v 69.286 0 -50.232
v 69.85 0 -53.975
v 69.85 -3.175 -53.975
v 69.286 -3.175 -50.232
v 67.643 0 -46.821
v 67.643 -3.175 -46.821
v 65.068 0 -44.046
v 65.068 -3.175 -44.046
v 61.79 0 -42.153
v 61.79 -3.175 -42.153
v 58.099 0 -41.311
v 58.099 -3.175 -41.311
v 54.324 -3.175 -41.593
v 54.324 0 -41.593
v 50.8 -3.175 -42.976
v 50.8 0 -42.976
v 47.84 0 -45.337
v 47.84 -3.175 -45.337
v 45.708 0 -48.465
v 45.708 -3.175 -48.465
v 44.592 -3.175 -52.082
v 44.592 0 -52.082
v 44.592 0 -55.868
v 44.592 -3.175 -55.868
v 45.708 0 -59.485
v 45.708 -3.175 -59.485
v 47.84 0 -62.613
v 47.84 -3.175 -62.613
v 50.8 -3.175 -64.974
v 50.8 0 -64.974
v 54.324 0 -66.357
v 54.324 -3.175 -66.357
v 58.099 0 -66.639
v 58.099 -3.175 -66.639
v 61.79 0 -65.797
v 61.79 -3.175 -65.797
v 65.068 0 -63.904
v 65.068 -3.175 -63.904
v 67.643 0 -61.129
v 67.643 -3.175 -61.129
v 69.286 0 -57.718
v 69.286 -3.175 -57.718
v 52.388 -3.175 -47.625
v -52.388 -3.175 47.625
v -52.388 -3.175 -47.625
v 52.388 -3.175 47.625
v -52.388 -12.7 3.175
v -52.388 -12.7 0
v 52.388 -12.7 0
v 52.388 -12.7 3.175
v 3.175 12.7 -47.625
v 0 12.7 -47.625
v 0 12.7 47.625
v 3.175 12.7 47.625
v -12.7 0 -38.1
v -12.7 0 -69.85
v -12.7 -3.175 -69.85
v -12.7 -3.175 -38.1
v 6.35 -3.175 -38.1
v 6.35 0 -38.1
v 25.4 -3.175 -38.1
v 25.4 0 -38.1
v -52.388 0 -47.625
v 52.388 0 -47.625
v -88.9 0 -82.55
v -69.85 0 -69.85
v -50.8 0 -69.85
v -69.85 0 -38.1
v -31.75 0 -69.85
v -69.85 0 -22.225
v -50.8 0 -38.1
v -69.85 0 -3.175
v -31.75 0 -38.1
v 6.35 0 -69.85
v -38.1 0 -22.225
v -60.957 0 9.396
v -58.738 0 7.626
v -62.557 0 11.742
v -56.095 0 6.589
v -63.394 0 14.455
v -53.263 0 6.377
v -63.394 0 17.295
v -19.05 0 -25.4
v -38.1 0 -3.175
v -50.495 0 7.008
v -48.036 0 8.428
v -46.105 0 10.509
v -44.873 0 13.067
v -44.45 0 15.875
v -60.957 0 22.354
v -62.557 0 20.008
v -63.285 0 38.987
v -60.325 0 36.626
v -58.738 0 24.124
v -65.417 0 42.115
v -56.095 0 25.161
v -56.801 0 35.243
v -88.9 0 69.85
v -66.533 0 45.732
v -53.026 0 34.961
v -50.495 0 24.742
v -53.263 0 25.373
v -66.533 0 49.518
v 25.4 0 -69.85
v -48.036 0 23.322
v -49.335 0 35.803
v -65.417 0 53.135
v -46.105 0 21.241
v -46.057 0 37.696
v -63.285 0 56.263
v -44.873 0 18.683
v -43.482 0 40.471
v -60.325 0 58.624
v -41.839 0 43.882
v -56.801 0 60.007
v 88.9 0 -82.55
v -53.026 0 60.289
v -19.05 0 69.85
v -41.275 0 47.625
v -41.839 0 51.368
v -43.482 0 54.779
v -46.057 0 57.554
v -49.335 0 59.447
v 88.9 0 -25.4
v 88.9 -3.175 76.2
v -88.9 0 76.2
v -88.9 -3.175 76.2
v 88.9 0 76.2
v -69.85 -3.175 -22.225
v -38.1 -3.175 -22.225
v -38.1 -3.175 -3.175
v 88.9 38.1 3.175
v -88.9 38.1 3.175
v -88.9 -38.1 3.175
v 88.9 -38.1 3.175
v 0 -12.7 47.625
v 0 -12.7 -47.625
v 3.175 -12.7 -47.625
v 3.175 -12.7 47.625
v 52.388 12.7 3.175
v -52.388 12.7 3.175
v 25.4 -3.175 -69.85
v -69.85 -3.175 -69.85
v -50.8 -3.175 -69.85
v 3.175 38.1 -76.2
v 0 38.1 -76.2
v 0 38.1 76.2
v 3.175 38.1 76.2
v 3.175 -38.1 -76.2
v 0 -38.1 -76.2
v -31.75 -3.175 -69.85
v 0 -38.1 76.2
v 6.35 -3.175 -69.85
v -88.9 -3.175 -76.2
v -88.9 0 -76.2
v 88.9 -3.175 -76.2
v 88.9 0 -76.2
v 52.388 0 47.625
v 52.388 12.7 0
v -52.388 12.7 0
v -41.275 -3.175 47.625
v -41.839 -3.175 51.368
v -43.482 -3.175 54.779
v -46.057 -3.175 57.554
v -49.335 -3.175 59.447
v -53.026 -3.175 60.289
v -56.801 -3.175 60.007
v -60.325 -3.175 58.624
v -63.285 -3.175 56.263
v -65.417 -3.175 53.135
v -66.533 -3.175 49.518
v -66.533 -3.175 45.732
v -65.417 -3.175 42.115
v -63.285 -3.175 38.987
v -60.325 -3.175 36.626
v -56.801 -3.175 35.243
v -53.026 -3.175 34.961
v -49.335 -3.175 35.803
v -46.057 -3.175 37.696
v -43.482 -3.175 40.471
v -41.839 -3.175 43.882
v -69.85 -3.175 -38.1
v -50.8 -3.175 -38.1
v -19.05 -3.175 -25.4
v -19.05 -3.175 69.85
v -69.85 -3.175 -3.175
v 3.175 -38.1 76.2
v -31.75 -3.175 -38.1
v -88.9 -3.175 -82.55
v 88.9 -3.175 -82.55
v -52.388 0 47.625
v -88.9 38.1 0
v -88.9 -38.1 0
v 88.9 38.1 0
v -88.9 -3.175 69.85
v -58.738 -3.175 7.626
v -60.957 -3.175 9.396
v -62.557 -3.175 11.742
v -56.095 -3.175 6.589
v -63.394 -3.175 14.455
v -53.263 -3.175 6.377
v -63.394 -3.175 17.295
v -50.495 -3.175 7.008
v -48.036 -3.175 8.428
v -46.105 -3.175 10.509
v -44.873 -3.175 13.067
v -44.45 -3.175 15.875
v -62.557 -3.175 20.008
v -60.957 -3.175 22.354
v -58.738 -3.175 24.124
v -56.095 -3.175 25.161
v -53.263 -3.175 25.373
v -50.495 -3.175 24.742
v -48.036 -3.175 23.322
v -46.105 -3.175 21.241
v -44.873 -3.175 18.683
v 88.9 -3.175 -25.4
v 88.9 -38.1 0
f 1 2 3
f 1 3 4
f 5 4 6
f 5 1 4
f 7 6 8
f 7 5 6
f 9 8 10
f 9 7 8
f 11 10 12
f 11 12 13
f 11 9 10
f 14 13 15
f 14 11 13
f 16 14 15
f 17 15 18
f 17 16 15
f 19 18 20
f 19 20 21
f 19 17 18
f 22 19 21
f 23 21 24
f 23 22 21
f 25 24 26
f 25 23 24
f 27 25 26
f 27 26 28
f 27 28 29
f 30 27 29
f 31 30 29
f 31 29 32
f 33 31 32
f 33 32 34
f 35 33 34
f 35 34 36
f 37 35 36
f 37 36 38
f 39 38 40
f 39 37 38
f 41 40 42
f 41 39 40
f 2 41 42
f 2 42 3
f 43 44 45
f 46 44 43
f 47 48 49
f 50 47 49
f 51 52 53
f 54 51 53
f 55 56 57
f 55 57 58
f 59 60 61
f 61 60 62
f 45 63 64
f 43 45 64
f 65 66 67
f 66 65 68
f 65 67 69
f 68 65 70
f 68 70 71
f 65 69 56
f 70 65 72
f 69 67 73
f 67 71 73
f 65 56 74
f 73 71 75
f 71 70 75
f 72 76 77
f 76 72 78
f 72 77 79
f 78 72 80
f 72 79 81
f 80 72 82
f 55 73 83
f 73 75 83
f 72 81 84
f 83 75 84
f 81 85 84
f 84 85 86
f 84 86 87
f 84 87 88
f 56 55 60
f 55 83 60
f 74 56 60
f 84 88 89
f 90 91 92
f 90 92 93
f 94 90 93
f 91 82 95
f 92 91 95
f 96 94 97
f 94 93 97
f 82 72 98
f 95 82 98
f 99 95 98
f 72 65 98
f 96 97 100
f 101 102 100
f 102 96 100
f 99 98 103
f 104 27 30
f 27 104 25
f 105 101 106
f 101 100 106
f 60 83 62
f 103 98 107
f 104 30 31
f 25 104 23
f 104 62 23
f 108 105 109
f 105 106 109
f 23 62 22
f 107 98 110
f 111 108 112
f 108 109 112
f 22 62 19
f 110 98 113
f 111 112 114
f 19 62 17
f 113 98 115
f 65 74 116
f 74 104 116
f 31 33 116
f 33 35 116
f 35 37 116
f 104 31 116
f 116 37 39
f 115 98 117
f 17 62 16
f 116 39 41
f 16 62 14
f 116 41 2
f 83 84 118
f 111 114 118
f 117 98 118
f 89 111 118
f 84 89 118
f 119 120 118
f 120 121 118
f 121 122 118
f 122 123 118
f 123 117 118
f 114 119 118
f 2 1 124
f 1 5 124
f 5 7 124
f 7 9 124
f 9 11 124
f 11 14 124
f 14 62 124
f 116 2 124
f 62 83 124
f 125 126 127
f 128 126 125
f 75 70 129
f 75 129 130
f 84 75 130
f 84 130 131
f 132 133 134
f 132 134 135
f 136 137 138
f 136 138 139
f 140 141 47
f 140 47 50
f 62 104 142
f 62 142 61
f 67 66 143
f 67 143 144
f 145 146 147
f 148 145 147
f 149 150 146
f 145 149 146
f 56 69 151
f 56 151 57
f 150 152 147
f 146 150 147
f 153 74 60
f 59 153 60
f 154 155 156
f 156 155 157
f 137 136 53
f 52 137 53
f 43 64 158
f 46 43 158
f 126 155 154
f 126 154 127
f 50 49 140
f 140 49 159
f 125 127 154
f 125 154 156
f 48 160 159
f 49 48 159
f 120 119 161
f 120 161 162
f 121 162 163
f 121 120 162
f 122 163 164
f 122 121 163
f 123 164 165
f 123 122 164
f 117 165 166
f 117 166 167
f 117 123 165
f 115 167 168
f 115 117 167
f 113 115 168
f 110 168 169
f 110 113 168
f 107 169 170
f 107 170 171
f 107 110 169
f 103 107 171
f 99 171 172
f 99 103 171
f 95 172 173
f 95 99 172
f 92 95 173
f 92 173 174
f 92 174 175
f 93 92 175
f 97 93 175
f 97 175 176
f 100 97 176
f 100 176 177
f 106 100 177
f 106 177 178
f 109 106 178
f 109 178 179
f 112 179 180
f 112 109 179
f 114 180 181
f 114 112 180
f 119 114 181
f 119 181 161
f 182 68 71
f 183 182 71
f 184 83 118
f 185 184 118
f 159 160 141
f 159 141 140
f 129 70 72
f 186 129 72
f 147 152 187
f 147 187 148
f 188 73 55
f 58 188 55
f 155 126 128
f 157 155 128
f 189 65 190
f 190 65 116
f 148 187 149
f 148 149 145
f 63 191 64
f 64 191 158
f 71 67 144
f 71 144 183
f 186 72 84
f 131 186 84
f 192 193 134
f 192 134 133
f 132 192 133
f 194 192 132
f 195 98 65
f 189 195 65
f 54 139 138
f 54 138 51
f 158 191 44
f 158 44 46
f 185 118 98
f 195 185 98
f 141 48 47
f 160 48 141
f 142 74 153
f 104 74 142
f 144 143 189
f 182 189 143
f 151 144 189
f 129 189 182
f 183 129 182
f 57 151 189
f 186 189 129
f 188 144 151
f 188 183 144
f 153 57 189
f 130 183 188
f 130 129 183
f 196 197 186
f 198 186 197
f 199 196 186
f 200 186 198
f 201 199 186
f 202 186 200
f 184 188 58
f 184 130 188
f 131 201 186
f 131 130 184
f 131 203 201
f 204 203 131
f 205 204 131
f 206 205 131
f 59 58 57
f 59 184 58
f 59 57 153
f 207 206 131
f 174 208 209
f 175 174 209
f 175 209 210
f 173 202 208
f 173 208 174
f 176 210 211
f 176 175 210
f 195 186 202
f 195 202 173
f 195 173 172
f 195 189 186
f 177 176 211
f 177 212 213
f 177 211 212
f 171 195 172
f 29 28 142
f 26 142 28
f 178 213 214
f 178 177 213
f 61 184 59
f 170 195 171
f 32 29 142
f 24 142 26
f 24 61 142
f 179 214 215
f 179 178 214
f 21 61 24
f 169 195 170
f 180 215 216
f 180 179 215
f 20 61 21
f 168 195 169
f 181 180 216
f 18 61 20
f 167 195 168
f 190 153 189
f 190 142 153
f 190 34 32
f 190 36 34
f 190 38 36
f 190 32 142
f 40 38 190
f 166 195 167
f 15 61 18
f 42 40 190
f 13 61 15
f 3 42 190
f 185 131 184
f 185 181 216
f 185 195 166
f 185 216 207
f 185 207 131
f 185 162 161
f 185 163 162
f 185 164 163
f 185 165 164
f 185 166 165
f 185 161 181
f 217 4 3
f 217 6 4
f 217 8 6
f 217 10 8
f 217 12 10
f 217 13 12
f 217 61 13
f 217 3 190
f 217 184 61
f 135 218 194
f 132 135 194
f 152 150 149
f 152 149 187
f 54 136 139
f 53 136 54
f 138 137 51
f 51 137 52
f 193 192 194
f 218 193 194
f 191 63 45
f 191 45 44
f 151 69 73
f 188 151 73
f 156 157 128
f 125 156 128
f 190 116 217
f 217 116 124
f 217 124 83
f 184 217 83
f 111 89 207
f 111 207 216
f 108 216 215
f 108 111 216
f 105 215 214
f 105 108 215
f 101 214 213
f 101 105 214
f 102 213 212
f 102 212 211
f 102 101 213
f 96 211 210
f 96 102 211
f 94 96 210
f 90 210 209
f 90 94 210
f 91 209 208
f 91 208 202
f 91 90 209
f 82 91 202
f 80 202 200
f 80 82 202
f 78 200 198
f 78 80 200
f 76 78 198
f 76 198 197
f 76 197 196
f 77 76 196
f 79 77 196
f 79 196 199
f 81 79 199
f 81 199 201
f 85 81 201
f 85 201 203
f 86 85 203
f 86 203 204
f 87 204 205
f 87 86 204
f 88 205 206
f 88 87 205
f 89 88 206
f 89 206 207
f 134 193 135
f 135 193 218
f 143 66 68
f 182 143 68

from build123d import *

# Parameters (mm, degrees)
F0_W      = 19.05
F0_H      = 31.75
F0_W_2    = 31.75
F0_H_2    = 19.05
F0_R      = 12.7
F0_R_2    = 9.525
F5_DEPTH  = 3.175
F1_W      = 104.775
F1_H      = 95.25
F6_DEPTH  = 3.175
F2_W      = 76.2
F2_H      = 152.4
F7_DEPTH  = 3.175
F3_W      = 177.8
F3_H      = 76.2
F8_DEPTH  = 3.175
F4_W      = 177.8
F4_H      = 152.4
F9_DEPTH  = 3.175
F10_W     = 25.4
F10_H     = 95.25
F11_DEPTH = 3.175
F12_W     = 104.775
F12_H     = 25.4
F13_DEPTH = 3.175


with BuildPart() as f5:
    # F0 (on Front) → F5 (new body)
    with BuildSketch(Plane.XZ):
        Polygon((-19.05, -25.4), (-19.05, 69.85), (-88.9, 69.85), (-88.9, -69.85), (-88.9, -82.55), (88.9, -82.55), (88.9, -69.85), (88.9, -47.625), (88.9, -25.4), align=None)
        with Locations((-60.325, -53.975)):
            Rectangle(F0_W, F0_H, mode=Mode.SUBTRACT)
        with Locations((-22.225, -53.975)):
            Rectangle(F0_W, F0_H, mode=Mode.SUBTRACT)
        with Locations((-53.975, -12.7)):
            Rectangle(F0_W_2, F0_H_2, mode=Mode.SUBTRACT)
        with Locations((15.875, -53.975)):
            Rectangle(F0_W, F0_H, mode=Mode.SUBTRACT)
        with Locations((57.15, -53.975)):
            Circle(F0_R, mode=Mode.SUBTRACT)
        with Locations((-53.975, 15.875)):
            Circle(F0_R_2, mode=Mode.SUBTRACT)
        with Locations((-53.975, 47.625)):
            Circle(F0_R, mode=Mode.SUBTRACT)
    extrude(amount=F5_DEPTH)


with BuildPart() as f6:
    # F1 (on Front) → F6 (new body)
    with BuildSketch(Plane.XZ):
        Rectangle(F1_W, F1_H)
    extrude(amount=F6_DEPTH)


with BuildPart() as f7:
    # F2 (on Right) → F7 (new body)
    with BuildSketch(Plane.YZ):
        Rectangle(F2_W, F2_H)
    extrude(amount=F7_DEPTH)


with BuildPart() as f8:
    # F3 (on Top) → F8 (new body)
    with BuildSketch(Plane.XY):
        Rectangle(F3_W, F3_H)
    extrude(amount=F8_DEPTH)


with BuildPart() as f9:
    # F4 (on Front) → F9 (new body)
    with BuildSketch(Plane.XZ):
        Rectangle(F4_W, F4_H)
    extrude(amount=F9_DEPTH)


with BuildPart() as f11:
    # F10 (on Right) → F11 (new body)
    with BuildSketch(Plane.YZ):
        Rectangle(F10_W, F10_H)
    extrude(amount=F11_DEPTH)


with BuildPart() as f13:
    # F12 (on Top) → F13 (new body)
    with BuildSketch(Plane.XY):
        Rectangle(F12_W, F12_H)
    extrude(amount=F13_DEPTH)


solid = Compound([f5.part, f6.part, f7.part, f8.part, f9.part, f11.part, f13.part])
